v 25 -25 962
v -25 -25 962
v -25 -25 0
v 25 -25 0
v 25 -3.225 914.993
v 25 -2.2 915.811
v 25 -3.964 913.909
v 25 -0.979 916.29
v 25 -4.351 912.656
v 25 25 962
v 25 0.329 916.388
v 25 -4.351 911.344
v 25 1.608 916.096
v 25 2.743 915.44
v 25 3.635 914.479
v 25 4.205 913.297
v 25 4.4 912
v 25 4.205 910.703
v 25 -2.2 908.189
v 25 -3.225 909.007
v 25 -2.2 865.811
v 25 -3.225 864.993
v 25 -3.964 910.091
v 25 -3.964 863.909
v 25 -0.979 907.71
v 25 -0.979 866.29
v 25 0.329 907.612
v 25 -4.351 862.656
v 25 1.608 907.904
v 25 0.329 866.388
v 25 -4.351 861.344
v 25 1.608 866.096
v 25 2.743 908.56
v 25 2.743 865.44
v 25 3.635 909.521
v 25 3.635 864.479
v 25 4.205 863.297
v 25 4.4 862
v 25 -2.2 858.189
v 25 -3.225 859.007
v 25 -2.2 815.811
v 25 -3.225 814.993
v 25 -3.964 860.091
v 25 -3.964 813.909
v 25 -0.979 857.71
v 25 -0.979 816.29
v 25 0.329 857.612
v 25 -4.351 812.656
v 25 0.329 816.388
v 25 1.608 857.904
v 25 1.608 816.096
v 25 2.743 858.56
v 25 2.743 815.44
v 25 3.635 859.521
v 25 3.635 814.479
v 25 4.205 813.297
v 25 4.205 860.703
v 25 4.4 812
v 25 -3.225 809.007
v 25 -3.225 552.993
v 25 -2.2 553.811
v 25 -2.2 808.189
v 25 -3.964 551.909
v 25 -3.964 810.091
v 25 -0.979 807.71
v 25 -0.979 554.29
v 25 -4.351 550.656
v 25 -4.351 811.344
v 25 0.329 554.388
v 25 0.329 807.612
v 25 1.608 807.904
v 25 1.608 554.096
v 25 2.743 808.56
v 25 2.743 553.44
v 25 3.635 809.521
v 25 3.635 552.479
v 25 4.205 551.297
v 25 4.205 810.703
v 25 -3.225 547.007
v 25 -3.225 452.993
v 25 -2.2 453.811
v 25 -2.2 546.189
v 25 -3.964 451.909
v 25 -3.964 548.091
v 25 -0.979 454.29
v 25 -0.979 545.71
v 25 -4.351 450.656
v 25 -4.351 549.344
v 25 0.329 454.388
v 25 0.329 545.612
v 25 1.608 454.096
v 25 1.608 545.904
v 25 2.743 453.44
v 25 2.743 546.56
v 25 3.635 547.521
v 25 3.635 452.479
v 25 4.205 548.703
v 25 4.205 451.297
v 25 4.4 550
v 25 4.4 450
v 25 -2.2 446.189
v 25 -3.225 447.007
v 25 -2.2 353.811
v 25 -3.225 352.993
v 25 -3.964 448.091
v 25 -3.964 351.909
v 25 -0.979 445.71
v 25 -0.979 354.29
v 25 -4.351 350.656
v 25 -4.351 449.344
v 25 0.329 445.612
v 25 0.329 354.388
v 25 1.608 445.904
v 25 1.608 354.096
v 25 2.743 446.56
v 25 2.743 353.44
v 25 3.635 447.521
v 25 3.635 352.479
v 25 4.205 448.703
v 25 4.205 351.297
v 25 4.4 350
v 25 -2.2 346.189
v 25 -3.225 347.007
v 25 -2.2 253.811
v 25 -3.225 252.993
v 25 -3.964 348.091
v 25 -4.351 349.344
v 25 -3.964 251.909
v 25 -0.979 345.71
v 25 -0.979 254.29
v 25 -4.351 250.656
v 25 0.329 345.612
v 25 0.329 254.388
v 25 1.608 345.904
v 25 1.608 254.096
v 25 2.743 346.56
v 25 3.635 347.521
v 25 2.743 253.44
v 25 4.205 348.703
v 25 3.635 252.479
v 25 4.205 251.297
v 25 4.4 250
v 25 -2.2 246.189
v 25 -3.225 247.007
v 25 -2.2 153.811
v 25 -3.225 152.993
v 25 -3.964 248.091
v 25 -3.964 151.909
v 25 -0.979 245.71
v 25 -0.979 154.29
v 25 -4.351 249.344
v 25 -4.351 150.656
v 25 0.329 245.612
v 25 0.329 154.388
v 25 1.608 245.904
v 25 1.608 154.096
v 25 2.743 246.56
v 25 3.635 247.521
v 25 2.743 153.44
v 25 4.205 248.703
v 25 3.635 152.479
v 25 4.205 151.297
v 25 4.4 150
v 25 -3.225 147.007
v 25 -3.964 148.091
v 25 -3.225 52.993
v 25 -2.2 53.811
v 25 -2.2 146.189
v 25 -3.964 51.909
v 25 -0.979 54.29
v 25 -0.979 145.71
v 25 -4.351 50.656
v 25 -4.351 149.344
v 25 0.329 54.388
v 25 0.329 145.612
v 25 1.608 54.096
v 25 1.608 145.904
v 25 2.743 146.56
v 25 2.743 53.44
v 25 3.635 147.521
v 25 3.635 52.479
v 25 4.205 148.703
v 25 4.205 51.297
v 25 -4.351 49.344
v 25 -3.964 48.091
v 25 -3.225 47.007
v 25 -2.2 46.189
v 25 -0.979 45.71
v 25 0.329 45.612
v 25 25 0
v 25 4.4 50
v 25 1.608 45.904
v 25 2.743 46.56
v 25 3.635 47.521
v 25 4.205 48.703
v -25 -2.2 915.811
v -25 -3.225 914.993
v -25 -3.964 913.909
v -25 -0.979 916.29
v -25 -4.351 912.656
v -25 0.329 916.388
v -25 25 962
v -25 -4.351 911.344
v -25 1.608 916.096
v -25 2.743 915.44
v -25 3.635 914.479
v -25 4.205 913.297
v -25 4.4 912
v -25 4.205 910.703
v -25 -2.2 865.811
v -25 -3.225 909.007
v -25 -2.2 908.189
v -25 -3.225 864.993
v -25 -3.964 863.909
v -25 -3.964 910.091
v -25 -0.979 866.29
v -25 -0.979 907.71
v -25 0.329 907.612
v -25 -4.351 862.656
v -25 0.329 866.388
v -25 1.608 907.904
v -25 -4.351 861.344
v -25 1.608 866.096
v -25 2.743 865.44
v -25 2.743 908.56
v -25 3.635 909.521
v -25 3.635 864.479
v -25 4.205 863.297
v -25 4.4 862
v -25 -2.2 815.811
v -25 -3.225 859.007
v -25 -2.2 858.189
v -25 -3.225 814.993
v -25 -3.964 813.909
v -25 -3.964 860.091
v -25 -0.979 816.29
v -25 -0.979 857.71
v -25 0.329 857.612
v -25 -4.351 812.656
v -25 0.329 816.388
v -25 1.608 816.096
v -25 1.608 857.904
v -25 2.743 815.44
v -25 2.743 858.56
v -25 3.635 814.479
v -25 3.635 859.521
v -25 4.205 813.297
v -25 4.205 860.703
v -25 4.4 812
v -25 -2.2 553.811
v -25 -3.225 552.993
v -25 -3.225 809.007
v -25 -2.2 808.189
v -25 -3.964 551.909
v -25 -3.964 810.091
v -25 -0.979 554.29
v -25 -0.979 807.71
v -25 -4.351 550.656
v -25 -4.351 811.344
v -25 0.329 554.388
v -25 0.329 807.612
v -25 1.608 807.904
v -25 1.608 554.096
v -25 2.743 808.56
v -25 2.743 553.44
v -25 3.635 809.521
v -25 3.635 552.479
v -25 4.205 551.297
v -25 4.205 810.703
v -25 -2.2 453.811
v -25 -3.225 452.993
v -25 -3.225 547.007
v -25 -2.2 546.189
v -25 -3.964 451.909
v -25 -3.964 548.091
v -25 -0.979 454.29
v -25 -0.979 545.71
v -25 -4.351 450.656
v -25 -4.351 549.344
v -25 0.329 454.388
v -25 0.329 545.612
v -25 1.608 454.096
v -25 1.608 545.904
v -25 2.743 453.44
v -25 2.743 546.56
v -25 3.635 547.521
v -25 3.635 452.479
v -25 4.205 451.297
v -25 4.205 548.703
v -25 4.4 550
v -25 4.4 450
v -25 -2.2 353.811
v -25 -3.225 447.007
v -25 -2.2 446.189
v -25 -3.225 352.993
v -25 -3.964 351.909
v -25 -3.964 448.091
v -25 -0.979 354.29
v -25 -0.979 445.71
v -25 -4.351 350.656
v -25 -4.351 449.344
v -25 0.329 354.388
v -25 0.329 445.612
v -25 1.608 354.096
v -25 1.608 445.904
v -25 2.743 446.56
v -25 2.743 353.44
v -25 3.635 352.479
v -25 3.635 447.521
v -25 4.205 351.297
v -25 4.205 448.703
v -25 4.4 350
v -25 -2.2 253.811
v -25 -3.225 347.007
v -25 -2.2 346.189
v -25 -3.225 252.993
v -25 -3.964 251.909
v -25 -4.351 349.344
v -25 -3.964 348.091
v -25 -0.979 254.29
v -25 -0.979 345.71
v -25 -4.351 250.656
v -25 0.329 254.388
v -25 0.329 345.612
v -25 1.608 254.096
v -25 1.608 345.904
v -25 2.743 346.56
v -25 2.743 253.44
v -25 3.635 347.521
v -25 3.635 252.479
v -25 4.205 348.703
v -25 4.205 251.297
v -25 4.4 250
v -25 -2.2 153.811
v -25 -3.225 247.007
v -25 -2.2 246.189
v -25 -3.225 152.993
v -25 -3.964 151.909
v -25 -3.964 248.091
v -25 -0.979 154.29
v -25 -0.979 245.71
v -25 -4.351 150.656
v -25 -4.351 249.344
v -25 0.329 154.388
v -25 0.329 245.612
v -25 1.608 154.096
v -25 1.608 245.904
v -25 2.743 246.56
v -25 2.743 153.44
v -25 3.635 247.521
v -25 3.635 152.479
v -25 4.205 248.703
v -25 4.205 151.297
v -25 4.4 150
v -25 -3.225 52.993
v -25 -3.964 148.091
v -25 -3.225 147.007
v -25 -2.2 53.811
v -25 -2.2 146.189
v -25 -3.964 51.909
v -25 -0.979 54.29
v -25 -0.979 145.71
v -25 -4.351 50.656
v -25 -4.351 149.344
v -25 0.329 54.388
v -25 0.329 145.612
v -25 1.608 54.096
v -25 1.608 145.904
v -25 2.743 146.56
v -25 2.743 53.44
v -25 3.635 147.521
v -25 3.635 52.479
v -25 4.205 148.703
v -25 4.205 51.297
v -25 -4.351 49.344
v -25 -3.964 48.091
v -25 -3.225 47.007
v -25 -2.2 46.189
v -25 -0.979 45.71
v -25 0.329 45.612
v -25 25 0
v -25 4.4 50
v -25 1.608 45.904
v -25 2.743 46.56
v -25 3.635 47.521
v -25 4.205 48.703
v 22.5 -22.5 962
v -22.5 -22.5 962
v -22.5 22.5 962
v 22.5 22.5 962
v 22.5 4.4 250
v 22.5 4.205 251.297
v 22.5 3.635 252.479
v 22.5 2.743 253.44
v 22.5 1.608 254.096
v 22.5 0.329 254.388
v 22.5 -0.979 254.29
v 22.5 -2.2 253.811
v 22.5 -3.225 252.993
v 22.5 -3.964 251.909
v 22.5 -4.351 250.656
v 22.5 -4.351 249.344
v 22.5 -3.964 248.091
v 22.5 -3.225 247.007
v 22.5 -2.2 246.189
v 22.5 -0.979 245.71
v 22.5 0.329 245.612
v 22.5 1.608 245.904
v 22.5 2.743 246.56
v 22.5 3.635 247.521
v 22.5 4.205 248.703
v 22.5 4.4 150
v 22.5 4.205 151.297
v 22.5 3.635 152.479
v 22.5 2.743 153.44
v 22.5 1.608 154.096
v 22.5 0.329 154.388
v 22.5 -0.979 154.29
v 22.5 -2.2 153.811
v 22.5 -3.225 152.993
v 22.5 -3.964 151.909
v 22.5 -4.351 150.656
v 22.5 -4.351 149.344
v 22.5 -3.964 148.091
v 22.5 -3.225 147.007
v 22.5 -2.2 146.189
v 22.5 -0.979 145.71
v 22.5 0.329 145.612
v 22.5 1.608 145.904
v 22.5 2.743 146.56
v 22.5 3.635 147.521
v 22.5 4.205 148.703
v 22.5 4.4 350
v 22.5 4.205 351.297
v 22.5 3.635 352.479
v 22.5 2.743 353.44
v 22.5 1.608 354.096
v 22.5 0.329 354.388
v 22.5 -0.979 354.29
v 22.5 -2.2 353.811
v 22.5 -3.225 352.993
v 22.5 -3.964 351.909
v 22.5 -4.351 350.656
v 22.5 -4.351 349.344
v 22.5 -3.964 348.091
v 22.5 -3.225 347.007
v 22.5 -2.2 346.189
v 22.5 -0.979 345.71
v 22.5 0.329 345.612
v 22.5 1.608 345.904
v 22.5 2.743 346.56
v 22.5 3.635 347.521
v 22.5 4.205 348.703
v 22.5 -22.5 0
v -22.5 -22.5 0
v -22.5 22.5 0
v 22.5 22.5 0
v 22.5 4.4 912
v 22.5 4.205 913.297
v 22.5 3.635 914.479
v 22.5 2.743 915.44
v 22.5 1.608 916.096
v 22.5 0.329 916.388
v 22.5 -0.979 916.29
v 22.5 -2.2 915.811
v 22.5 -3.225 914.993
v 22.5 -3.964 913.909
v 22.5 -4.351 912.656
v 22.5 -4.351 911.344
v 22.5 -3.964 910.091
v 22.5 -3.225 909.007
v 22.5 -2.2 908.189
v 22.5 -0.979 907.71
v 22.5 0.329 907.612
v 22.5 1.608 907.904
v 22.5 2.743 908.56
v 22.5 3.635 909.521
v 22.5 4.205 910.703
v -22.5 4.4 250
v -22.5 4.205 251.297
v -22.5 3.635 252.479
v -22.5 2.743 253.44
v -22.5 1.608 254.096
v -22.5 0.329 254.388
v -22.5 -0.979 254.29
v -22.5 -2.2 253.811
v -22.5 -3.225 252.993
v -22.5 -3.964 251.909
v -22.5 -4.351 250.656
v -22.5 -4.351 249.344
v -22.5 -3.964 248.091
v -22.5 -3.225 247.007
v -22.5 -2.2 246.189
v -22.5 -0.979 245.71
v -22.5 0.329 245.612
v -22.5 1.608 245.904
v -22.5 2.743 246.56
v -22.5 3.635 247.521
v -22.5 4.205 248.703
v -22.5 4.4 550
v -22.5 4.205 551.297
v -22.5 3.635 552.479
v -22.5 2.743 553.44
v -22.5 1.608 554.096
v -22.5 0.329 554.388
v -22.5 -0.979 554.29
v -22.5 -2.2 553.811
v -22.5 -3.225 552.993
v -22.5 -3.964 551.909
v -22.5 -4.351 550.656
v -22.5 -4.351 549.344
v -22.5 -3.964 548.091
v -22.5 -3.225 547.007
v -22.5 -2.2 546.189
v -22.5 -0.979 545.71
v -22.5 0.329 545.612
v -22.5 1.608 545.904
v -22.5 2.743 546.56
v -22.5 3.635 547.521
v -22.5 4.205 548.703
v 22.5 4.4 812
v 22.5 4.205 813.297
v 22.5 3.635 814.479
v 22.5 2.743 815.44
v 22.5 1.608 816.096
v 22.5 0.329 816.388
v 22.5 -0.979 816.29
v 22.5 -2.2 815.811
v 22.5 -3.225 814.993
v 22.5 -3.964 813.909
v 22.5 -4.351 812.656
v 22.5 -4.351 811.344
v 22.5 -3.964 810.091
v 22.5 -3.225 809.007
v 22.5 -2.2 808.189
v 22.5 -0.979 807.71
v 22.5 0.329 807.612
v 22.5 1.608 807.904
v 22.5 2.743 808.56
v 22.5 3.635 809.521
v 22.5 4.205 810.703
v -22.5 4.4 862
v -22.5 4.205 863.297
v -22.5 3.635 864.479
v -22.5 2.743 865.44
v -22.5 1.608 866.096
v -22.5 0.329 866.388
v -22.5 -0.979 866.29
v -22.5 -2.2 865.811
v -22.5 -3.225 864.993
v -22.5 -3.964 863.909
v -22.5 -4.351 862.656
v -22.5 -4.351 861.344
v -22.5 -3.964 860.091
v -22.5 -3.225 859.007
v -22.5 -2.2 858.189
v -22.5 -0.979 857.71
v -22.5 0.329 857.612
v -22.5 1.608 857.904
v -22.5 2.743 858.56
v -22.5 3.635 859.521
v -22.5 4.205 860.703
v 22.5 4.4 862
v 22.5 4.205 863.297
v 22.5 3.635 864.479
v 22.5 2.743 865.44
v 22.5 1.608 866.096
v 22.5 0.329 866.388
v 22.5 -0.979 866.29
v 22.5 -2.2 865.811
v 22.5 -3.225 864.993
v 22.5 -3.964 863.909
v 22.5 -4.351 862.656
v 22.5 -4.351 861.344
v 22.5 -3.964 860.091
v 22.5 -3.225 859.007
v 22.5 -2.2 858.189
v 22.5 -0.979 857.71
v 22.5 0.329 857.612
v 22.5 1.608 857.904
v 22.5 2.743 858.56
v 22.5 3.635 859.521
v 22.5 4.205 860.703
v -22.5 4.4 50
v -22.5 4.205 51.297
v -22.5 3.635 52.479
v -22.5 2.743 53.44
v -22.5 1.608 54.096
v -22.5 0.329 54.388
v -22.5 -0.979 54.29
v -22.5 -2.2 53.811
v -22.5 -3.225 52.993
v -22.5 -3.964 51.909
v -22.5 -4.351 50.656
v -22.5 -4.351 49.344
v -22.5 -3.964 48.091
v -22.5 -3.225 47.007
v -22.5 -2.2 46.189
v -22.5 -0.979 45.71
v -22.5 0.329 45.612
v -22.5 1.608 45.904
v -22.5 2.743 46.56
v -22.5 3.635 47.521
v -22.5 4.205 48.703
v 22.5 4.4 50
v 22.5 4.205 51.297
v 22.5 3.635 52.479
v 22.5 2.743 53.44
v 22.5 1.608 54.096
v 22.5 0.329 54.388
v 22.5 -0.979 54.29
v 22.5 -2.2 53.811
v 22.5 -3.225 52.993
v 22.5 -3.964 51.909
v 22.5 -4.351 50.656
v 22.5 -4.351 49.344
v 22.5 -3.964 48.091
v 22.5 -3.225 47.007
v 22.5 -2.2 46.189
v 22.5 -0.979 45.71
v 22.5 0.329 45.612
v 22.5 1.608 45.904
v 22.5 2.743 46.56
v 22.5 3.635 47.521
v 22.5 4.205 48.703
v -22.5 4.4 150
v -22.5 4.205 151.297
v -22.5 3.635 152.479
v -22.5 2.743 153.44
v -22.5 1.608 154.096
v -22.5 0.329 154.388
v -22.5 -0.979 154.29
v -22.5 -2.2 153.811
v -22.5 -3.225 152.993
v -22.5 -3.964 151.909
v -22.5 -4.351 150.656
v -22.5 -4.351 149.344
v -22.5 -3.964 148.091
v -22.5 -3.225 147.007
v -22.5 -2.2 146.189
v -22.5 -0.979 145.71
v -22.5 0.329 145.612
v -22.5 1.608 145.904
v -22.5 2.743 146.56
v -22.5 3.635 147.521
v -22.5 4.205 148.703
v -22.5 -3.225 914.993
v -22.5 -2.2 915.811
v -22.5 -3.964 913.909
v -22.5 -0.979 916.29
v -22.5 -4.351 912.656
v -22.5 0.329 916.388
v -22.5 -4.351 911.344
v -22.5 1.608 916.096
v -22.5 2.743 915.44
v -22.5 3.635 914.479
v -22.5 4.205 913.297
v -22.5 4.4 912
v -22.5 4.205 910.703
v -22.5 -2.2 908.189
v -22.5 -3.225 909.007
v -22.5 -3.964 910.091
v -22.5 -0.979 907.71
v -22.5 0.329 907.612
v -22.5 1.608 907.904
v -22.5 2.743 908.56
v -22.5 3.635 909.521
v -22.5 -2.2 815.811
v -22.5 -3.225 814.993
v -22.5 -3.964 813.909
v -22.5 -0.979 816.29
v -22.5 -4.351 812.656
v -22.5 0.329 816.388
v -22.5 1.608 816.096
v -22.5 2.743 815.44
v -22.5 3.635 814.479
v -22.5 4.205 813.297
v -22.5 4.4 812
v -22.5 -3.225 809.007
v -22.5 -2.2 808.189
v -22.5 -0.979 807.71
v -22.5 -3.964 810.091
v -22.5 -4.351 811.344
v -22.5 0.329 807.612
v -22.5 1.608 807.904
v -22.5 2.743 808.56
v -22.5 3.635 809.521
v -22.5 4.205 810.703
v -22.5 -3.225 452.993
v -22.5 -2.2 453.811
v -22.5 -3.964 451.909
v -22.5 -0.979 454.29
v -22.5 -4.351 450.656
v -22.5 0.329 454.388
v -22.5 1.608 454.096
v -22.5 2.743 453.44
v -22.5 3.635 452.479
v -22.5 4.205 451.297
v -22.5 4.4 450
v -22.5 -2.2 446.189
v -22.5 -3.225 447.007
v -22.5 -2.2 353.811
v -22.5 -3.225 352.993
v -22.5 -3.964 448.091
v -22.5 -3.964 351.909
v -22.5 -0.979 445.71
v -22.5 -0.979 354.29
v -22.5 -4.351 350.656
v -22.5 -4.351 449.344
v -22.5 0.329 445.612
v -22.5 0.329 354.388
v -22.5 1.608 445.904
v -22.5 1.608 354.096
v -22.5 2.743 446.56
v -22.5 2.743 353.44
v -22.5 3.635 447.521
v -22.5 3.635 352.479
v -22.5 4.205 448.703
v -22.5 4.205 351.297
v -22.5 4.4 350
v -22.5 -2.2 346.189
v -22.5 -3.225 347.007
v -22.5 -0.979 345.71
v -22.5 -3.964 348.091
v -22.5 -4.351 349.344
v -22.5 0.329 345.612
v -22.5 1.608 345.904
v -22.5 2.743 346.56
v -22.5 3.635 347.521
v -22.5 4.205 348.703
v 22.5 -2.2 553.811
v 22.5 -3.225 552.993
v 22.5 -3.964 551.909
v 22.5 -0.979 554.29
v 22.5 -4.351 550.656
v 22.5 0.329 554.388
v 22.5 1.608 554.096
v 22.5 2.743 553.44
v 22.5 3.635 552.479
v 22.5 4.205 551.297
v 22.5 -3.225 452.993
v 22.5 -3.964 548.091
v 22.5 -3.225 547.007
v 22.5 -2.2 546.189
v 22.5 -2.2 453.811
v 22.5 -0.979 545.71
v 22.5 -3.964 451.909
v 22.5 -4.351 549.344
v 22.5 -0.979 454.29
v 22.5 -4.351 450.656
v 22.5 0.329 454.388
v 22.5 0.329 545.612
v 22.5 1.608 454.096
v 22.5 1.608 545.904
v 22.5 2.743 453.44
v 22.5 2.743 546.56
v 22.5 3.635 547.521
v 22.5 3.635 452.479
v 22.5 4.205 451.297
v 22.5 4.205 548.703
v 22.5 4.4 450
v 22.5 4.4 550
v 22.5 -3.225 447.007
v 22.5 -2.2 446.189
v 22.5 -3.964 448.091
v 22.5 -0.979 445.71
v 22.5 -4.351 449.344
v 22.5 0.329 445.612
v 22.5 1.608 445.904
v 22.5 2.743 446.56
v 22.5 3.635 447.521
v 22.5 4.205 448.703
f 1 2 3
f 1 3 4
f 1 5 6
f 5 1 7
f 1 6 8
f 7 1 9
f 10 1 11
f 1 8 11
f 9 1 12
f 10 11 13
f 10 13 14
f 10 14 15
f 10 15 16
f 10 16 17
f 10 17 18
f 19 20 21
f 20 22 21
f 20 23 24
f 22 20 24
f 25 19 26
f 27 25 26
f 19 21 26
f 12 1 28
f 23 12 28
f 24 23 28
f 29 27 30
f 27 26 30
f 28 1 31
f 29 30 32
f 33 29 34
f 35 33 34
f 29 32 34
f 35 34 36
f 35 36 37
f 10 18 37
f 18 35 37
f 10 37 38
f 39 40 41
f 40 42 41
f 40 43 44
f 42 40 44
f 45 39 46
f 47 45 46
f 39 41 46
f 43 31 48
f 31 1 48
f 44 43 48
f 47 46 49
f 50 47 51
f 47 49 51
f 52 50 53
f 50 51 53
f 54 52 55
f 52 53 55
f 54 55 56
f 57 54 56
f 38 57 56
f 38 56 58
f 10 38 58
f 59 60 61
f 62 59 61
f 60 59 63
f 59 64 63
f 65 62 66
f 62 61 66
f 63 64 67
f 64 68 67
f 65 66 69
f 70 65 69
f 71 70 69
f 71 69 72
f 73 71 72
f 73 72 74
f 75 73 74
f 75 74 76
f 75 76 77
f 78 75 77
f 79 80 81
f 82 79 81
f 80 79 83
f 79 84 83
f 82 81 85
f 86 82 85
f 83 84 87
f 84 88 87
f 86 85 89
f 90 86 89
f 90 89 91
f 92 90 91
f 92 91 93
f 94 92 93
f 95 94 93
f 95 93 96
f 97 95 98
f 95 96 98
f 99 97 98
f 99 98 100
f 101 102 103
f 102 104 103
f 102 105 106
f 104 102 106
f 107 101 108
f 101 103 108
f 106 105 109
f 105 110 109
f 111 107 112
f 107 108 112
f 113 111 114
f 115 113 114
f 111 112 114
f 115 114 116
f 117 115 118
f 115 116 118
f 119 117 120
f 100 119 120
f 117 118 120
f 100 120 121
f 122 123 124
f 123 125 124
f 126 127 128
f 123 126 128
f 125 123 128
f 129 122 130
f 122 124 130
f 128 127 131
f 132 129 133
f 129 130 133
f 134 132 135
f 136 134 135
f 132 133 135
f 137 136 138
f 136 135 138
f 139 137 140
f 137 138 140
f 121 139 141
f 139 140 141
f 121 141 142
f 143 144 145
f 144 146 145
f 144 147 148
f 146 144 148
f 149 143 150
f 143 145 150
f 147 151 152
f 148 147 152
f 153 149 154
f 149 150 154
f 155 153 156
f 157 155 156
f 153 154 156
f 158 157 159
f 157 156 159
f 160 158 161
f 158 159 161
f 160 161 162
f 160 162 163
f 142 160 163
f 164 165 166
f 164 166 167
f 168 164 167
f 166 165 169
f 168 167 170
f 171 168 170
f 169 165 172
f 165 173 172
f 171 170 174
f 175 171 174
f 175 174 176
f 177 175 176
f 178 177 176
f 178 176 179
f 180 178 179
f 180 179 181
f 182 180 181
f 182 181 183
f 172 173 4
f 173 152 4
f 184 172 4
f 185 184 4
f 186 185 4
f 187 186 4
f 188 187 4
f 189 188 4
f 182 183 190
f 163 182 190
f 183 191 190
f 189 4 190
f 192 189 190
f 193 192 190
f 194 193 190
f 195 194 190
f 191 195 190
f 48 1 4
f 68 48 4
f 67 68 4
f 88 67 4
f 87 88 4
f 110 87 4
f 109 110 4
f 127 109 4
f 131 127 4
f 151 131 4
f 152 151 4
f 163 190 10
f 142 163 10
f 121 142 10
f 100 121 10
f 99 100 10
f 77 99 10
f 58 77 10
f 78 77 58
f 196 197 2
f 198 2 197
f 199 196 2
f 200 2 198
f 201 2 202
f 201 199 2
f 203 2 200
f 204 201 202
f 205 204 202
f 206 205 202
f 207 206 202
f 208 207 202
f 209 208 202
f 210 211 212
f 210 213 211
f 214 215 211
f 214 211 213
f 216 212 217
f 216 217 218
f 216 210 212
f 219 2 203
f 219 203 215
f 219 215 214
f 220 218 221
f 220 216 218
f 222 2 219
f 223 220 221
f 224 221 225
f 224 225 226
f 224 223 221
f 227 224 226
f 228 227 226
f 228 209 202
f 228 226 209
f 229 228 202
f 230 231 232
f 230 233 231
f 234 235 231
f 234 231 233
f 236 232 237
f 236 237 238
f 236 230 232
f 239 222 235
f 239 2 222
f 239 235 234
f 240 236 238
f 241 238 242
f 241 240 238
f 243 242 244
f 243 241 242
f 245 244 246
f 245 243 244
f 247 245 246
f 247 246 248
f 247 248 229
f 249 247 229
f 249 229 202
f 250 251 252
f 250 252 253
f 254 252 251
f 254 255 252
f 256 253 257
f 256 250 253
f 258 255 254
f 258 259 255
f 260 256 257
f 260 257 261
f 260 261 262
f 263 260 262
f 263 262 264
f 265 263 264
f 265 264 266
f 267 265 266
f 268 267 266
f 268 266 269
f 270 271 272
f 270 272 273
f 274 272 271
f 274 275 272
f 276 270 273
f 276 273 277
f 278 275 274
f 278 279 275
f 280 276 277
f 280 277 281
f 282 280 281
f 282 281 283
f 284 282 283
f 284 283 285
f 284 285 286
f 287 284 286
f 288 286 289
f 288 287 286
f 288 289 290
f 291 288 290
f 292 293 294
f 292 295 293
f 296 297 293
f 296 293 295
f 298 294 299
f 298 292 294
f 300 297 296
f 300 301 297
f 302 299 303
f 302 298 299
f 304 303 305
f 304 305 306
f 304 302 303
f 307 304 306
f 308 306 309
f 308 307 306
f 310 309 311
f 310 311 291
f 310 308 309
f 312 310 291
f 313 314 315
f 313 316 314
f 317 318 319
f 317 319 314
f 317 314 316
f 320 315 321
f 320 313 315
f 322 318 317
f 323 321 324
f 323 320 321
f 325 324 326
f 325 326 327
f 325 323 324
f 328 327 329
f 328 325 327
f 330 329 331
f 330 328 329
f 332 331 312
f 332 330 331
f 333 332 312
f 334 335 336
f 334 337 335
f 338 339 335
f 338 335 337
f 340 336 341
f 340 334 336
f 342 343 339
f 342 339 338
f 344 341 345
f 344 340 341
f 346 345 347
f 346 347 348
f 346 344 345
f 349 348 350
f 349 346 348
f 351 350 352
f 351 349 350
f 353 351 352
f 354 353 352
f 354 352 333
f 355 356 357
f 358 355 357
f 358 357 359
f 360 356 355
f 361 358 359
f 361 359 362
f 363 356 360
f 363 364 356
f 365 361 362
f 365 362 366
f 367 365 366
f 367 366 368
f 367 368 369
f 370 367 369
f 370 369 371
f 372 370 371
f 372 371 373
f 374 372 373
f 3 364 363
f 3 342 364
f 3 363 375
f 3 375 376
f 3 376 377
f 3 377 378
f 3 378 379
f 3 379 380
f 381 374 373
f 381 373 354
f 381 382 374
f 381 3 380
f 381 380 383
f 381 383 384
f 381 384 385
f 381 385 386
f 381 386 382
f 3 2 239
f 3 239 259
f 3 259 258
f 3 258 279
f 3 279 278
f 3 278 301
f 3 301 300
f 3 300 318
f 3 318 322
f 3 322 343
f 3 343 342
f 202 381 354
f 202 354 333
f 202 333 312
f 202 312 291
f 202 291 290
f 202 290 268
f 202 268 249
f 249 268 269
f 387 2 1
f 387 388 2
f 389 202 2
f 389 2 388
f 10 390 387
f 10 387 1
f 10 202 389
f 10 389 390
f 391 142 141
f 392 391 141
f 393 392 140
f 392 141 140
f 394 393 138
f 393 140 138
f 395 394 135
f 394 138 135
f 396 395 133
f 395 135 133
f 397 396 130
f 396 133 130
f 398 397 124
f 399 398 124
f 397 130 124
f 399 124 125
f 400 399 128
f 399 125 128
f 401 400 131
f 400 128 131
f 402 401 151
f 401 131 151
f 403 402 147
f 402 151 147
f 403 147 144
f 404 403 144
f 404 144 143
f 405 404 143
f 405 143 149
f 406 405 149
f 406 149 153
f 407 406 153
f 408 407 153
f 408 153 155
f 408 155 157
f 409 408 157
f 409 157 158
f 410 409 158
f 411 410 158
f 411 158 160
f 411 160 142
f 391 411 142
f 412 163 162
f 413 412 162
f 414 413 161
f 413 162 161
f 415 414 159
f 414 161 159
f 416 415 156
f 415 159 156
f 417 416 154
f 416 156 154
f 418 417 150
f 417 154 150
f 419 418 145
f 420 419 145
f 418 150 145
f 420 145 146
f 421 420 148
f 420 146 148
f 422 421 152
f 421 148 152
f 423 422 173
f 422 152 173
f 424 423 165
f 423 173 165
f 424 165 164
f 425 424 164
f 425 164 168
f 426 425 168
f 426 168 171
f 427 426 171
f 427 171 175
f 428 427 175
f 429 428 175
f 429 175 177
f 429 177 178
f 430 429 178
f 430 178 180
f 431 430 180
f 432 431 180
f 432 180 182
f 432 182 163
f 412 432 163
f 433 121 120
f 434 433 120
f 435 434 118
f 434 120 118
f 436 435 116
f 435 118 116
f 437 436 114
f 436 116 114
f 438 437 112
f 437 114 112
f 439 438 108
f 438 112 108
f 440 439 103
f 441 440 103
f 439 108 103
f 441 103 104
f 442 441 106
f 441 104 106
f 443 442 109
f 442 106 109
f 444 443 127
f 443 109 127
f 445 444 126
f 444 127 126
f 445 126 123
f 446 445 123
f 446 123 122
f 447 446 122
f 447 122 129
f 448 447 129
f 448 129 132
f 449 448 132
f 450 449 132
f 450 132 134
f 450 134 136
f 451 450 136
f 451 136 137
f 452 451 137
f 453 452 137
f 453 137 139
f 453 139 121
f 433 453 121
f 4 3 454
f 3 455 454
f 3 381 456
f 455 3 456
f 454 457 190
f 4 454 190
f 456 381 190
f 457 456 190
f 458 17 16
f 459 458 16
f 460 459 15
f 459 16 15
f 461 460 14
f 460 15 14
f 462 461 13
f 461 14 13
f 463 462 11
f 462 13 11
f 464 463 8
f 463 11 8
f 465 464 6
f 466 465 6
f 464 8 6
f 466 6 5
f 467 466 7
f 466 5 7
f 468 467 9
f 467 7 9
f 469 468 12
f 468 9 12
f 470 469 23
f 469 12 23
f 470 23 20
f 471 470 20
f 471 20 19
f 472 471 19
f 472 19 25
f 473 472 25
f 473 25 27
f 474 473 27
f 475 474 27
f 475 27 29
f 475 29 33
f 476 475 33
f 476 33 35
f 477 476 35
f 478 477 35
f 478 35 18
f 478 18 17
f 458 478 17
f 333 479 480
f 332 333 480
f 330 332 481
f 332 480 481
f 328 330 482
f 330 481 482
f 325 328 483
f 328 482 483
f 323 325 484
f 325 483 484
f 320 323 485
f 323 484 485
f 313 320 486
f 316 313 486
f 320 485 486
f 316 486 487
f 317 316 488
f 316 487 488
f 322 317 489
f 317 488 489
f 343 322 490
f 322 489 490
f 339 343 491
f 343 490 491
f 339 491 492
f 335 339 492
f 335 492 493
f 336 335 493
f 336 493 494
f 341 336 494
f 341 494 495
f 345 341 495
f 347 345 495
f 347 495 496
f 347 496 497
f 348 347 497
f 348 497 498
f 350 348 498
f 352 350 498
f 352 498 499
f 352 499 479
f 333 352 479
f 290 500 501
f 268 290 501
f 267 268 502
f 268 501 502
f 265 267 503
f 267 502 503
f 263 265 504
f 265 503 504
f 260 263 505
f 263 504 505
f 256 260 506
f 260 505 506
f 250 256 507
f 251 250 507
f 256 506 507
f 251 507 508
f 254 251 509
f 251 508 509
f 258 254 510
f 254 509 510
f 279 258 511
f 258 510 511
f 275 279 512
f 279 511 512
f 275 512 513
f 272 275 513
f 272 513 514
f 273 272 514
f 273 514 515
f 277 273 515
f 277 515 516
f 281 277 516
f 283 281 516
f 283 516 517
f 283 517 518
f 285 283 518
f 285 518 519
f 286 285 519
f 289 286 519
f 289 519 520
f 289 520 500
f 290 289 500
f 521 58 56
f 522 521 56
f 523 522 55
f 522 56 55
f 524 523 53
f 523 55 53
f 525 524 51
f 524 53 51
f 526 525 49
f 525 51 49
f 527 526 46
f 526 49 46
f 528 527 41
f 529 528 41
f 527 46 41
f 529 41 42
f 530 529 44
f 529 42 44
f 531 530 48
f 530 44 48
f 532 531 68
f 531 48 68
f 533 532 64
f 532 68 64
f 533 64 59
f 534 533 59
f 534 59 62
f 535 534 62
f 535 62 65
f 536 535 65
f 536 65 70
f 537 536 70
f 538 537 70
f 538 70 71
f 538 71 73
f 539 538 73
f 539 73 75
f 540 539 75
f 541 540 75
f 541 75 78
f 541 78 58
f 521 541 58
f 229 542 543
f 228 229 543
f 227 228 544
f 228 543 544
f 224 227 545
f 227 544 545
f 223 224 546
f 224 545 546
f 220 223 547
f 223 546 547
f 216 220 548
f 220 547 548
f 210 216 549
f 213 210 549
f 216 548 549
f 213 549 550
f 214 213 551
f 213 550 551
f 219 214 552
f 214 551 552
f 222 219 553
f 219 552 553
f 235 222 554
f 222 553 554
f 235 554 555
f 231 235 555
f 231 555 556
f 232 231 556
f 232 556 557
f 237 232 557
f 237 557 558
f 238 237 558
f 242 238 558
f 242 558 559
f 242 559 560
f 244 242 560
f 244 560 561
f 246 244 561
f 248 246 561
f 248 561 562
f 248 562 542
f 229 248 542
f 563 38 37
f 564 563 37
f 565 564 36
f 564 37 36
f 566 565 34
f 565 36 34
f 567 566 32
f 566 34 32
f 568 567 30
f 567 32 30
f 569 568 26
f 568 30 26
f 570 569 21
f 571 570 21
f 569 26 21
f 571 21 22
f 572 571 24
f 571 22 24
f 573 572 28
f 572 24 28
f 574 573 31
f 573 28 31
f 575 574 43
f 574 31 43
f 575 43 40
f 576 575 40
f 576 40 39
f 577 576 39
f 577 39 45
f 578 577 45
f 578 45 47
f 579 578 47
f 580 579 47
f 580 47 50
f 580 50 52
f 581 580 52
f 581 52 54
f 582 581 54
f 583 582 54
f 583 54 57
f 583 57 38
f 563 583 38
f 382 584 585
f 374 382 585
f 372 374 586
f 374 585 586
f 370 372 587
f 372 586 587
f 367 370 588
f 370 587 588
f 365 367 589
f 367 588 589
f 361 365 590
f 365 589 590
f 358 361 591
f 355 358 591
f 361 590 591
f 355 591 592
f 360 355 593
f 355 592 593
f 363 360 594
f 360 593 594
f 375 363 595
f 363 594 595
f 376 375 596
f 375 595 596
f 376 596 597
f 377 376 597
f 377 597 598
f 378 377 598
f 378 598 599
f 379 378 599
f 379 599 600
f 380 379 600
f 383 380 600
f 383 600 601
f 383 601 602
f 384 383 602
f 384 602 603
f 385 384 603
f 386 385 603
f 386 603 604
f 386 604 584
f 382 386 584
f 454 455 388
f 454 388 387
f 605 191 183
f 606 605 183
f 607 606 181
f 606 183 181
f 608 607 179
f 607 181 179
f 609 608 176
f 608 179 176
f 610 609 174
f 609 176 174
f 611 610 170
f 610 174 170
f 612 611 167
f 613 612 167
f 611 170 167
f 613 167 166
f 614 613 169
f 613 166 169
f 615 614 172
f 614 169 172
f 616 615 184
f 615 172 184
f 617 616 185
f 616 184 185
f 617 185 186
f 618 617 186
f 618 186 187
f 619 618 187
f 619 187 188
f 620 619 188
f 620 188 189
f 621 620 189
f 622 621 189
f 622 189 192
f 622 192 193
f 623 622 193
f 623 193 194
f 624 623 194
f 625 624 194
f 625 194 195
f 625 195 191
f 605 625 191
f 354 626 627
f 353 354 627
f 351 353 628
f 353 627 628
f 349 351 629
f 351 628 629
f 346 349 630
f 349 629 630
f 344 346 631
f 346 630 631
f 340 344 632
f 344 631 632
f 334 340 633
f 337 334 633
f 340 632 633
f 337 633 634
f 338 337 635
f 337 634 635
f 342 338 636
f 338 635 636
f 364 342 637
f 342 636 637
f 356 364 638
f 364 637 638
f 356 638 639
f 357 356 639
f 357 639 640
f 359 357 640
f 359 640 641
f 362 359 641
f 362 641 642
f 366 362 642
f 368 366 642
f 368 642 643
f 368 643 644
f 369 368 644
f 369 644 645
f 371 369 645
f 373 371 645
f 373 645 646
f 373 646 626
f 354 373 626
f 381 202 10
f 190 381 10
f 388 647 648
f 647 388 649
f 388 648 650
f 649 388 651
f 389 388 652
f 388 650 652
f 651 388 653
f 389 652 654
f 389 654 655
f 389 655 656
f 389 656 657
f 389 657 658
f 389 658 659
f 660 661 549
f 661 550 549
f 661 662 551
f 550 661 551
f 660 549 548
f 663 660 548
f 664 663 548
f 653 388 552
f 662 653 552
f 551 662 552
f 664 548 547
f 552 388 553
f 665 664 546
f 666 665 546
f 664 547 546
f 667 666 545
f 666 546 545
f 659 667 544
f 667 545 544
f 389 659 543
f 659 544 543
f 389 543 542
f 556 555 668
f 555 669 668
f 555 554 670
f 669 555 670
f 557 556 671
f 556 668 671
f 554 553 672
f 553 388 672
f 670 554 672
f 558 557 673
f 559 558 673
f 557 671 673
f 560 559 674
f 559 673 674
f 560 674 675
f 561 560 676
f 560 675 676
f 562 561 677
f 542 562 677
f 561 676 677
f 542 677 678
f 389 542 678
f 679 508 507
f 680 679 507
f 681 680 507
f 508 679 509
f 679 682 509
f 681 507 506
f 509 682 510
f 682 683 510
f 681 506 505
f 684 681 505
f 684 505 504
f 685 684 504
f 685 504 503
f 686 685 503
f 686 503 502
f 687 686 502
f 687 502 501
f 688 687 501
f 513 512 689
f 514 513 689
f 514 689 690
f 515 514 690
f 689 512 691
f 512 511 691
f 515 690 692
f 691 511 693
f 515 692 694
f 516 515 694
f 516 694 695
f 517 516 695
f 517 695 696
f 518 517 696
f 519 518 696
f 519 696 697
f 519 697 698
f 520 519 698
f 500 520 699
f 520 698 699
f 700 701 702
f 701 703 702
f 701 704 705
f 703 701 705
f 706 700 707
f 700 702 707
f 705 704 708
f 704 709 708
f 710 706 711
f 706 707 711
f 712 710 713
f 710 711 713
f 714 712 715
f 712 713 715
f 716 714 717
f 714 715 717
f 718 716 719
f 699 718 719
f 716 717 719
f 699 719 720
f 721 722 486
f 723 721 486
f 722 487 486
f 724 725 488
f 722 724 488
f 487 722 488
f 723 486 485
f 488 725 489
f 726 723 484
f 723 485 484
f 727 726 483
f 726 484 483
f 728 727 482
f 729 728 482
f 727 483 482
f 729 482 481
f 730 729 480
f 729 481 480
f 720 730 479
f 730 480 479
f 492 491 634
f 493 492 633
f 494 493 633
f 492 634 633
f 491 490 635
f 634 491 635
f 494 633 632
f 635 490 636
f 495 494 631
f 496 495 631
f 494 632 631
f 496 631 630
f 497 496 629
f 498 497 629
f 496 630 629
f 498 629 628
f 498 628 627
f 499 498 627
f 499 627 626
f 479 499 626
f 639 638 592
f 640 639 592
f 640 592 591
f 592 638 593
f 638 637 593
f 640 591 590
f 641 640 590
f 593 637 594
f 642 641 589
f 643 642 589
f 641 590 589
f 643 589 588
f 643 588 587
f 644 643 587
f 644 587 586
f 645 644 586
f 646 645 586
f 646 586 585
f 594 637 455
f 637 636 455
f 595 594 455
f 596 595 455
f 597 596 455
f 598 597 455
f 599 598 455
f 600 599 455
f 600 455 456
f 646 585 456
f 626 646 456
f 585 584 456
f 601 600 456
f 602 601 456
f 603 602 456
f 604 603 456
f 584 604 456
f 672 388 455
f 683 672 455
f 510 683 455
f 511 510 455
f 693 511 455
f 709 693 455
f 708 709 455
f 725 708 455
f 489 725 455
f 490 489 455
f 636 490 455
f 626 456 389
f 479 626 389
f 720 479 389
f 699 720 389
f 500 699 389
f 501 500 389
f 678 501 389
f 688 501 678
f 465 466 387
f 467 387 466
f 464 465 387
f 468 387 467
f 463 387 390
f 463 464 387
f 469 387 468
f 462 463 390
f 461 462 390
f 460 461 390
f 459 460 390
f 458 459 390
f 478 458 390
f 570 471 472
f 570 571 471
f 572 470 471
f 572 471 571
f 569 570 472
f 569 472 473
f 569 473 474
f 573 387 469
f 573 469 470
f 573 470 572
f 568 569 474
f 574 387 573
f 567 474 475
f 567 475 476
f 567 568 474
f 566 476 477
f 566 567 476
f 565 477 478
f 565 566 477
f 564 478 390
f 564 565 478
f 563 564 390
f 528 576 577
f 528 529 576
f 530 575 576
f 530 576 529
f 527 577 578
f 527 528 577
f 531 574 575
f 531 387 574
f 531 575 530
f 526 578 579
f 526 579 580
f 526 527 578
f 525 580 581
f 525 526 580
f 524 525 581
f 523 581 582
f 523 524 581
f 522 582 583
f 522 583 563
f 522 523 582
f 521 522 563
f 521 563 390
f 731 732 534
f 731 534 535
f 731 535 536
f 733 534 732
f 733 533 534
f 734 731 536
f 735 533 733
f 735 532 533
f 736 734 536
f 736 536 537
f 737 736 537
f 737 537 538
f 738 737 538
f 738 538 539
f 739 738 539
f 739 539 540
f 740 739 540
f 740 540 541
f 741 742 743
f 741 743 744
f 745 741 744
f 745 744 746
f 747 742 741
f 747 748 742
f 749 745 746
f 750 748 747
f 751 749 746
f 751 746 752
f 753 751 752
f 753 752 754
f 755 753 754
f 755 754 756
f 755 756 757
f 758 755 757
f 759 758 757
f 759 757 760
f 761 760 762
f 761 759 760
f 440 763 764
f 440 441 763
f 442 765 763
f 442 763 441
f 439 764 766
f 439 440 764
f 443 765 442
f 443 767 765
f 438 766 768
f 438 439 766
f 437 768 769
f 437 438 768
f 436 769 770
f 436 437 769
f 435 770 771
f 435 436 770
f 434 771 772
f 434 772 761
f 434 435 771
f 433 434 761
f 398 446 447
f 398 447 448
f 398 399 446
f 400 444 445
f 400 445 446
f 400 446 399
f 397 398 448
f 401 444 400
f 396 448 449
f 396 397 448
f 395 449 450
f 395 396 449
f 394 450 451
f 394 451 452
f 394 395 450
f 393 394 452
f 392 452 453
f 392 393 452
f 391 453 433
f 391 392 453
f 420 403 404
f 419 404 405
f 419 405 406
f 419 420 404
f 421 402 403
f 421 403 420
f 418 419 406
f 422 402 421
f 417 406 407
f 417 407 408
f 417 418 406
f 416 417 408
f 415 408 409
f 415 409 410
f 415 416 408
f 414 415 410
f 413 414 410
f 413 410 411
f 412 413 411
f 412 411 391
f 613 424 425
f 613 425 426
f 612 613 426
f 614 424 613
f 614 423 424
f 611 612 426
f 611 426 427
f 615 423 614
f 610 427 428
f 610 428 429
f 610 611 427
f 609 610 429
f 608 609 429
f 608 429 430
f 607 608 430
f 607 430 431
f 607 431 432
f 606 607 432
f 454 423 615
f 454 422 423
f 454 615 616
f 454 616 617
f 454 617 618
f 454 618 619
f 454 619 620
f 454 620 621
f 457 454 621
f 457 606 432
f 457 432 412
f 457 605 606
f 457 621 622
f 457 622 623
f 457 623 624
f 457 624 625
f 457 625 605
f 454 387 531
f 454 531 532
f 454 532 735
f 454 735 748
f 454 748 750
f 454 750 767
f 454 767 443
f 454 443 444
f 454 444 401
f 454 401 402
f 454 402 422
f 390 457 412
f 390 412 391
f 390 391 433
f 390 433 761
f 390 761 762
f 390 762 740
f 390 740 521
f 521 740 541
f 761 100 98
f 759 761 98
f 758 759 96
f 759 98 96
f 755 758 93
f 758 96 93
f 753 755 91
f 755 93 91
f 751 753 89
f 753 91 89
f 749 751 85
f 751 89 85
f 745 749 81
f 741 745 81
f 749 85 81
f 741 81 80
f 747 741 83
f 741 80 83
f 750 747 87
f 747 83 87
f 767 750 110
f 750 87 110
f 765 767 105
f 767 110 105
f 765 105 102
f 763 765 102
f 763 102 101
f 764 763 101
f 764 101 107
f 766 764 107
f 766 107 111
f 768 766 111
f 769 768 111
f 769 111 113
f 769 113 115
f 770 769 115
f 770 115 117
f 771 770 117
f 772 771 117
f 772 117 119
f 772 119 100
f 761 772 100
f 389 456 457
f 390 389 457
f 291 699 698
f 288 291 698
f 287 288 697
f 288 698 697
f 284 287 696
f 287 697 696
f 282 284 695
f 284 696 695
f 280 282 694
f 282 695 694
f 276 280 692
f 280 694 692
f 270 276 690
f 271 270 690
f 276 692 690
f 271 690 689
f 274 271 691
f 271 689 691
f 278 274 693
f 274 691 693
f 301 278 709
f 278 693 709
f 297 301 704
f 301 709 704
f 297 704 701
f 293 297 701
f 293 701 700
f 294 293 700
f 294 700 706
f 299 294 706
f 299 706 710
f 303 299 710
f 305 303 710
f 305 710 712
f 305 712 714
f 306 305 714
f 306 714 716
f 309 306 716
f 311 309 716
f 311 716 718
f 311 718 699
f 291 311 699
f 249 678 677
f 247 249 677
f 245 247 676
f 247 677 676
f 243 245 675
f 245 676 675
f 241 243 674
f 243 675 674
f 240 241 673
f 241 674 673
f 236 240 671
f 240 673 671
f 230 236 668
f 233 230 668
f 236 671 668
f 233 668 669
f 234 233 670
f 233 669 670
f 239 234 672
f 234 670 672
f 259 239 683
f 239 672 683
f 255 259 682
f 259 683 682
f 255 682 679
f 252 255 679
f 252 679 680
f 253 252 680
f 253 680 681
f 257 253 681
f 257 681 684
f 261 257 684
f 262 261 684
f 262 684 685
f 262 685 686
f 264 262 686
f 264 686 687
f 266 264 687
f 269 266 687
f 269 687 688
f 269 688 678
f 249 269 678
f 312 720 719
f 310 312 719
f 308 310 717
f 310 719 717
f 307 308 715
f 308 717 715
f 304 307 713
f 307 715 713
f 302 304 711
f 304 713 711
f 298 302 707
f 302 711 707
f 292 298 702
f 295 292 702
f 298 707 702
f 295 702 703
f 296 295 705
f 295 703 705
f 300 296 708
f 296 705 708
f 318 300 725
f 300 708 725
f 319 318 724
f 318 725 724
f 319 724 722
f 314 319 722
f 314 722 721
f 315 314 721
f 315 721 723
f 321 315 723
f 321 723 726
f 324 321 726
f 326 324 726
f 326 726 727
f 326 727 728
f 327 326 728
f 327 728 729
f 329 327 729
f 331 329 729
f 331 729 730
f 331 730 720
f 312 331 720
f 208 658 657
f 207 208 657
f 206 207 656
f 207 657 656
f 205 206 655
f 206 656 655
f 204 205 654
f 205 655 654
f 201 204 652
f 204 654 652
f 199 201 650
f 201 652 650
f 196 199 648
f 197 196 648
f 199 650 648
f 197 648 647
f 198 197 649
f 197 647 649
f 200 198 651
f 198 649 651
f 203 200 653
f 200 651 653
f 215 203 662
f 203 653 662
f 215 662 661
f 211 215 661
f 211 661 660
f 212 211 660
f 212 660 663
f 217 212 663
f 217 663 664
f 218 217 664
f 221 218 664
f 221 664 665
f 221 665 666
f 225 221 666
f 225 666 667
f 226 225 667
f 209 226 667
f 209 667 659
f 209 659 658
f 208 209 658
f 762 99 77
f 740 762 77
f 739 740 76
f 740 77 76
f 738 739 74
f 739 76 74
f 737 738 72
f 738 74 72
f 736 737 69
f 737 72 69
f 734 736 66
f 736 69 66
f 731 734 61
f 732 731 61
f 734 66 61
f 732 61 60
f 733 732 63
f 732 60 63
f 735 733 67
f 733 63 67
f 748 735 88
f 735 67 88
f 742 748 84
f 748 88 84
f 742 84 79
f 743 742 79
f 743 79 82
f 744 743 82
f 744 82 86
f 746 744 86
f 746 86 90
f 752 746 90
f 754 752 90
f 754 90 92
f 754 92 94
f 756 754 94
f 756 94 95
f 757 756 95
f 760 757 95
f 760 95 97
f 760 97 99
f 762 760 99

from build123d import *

# Parameters (mm, degrees)
F0_W     = 50
F0_H     = 50
F0_W_2   = 45
F0_H_2   = 45
F1_DEPTH = 962
F3_D     = 8.8


with BuildPart() as f1:
    # F0 (on Top) → F1 (new body)
    with BuildSketch(Plane.XY):
        Rectangle(F0_W, F0_H)
        Rectangle(F0_W_2, F0_H_2, mode=Mode.SUBTRACT)
    extrude(amount=F1_DEPTH)

    # F3 (through all)
    with Locations(Plane(origin=(-25, 0, 0), x_dir=(0, -1, 0), z_dir=(-1, 0, 0))):
        with Locations((0, 350), (0, 450), (0, 550), (0, 250), (0, 150), (0, 50), (0, 812), (0, 912), (0, 862)):
            Hole(F3_D / 2)


solid = f1.part
